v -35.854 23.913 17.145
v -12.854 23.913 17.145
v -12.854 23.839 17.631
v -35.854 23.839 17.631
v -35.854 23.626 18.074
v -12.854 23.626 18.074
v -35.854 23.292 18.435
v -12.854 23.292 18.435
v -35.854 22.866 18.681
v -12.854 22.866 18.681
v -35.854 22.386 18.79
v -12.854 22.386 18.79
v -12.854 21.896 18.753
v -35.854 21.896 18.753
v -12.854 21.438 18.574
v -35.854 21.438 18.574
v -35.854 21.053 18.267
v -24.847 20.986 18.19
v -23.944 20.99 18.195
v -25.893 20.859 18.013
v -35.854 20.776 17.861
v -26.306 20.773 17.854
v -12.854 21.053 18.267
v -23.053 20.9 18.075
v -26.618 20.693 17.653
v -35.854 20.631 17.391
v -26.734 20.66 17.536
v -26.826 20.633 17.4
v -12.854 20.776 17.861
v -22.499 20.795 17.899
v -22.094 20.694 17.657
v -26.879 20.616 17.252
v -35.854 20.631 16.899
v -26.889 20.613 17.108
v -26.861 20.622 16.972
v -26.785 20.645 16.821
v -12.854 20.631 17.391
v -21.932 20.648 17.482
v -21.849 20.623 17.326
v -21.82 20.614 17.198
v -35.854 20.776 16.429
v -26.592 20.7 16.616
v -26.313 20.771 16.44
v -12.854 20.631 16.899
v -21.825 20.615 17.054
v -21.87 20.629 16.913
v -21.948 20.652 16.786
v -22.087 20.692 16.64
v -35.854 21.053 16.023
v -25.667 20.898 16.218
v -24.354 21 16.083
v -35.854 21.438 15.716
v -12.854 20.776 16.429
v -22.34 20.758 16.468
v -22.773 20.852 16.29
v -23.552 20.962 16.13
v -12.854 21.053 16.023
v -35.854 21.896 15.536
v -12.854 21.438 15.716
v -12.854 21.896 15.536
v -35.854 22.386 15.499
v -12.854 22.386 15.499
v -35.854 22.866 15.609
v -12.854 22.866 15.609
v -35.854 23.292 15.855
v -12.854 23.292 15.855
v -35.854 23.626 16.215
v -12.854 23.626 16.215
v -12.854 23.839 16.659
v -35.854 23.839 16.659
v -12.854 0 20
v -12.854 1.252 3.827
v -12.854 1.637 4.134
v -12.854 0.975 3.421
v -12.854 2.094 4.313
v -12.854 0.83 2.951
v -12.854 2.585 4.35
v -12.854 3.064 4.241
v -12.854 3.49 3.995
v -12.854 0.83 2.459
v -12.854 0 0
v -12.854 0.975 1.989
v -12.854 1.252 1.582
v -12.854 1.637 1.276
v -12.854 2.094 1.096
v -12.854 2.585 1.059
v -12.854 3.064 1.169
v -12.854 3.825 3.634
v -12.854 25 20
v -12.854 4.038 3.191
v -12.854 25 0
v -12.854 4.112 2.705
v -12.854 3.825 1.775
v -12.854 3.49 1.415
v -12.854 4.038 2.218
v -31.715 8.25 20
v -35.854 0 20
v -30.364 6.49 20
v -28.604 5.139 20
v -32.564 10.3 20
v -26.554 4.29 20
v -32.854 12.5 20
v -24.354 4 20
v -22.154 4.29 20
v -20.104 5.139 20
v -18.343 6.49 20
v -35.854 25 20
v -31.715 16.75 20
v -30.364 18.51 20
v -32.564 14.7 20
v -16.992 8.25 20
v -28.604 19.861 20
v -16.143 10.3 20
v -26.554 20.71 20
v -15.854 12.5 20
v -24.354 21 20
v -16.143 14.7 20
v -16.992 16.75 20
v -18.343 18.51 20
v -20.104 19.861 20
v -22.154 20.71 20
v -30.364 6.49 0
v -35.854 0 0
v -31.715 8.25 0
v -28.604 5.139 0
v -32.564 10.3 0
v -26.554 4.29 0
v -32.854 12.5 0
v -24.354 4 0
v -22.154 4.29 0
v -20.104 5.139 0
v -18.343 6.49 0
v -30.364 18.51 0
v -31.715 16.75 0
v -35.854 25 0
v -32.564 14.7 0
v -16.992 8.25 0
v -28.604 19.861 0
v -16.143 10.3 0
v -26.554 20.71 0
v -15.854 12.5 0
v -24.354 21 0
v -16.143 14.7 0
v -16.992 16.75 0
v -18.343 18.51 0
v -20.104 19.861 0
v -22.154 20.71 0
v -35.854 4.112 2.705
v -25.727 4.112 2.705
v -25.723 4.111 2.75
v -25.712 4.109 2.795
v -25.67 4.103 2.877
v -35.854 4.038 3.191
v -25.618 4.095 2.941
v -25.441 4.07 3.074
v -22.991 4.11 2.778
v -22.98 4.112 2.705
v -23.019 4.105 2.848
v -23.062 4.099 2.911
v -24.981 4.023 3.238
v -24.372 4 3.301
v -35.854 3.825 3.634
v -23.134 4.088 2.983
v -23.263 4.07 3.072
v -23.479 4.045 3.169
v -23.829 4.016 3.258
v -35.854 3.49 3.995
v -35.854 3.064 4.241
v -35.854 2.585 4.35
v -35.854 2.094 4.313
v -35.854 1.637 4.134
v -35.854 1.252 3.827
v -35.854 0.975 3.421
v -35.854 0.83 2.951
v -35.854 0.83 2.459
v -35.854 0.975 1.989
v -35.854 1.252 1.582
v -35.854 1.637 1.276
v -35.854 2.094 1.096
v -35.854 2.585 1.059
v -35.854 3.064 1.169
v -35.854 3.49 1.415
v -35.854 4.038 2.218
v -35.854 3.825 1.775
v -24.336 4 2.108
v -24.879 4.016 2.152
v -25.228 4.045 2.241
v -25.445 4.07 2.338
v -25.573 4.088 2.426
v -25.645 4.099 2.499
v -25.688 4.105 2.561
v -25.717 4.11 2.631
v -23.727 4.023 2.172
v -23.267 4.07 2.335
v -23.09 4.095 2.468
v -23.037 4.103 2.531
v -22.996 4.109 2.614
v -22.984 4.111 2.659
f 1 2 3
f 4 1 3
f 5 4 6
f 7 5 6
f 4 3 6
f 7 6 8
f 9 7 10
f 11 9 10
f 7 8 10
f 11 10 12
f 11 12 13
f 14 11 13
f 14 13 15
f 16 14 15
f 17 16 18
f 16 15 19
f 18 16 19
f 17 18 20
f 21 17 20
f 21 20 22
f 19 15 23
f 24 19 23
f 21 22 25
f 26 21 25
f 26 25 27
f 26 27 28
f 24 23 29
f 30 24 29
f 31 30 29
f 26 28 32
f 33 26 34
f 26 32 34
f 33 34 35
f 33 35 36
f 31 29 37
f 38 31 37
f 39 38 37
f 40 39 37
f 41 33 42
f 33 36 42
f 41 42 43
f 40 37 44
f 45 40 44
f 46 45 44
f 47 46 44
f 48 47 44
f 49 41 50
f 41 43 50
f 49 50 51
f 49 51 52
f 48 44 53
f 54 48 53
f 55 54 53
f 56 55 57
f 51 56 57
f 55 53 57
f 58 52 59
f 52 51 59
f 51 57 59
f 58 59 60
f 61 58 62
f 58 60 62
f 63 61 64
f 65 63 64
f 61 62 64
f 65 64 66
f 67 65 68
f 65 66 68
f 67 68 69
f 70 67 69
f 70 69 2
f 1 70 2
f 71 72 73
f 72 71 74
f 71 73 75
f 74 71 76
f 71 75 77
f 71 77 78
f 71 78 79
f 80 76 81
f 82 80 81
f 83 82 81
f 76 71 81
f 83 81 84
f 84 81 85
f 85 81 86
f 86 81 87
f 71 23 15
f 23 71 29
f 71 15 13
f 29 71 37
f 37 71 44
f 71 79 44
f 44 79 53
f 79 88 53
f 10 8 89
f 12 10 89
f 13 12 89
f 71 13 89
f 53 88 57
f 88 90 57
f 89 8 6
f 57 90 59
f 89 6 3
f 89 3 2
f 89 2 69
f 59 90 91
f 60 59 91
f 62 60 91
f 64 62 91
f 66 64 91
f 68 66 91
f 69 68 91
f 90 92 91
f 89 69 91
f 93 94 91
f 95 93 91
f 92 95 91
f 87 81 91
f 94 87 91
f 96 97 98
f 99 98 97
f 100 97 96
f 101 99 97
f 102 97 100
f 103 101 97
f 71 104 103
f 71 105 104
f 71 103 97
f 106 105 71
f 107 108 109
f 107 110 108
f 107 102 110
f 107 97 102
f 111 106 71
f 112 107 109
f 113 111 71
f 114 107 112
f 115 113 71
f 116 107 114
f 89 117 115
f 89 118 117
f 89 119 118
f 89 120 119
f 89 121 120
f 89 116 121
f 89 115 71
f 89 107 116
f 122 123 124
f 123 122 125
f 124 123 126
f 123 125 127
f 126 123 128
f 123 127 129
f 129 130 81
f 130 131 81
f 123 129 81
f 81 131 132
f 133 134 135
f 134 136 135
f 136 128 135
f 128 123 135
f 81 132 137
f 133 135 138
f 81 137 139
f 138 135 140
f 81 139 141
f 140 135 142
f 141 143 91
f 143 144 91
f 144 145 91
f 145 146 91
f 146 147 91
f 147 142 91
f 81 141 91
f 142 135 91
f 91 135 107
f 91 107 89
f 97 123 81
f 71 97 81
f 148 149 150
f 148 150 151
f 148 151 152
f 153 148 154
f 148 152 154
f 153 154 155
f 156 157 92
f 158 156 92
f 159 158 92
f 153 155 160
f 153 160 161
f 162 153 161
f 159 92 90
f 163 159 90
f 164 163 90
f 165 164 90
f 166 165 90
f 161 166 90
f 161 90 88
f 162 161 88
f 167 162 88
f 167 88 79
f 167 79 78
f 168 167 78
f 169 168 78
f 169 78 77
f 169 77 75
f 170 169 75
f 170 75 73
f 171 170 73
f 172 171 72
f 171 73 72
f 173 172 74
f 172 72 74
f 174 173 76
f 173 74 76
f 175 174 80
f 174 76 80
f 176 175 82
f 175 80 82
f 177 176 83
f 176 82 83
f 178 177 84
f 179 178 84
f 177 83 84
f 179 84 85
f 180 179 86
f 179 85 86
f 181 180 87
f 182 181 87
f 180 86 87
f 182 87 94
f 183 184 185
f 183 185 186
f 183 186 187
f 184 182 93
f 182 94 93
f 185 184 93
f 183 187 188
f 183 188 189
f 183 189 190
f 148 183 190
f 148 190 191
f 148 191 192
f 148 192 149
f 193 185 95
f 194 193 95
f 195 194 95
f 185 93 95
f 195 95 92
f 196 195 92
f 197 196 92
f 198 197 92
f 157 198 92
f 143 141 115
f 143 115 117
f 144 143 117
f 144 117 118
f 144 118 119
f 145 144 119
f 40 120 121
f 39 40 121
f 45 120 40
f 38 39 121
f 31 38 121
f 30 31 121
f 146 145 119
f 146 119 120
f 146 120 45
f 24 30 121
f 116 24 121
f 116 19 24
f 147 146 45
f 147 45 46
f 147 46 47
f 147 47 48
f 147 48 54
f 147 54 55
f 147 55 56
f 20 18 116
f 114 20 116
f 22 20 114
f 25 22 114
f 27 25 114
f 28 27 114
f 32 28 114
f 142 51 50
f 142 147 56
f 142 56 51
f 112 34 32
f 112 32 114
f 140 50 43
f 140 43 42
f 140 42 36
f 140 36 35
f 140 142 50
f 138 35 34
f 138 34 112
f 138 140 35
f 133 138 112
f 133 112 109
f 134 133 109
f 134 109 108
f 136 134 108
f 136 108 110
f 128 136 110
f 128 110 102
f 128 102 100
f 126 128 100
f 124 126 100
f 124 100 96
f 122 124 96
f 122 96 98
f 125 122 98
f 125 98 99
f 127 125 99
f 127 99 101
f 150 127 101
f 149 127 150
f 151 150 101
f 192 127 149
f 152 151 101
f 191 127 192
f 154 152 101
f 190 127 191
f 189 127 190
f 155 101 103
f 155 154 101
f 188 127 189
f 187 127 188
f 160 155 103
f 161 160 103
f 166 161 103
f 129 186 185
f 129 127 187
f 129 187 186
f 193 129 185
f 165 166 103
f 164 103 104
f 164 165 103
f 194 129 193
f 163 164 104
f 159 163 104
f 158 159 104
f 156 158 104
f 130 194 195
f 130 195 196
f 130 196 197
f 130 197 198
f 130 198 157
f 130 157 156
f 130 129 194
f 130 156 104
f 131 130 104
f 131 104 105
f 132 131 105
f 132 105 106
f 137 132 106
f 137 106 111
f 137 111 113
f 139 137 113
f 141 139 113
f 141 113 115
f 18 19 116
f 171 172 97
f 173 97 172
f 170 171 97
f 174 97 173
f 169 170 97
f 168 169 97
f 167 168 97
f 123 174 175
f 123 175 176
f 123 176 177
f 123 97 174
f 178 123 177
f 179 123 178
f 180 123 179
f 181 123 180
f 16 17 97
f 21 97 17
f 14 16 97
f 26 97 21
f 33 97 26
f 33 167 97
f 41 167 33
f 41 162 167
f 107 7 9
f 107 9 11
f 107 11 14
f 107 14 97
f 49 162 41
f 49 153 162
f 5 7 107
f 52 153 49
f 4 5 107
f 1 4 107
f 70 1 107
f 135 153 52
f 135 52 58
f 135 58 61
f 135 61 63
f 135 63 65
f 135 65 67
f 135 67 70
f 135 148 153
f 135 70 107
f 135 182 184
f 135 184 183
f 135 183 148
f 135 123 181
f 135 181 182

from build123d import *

# Parameters (mm, degrees)
F0_W     = 23
F0_H     = 25
F0_R     = 8.5
F1_DEPTH = 20
F3_D     = 3.3


with BuildPart() as f1:
    # F0 (on Top) → F1 (new body)
    with BuildSketch(Plane.XY):
        with Locations((-24.353659, 12.5)):
            Rectangle(F0_W, F0_H)
        with Locations((-24.353659, 12.5)):
            Circle(F0_R, mode=Mode.SUBTRACT)
    extrude(amount=F1_DEPTH)

    # F3 (through all)
    with Locations(Plane(origin=(-35.853659, 0, 0), x_dir=(0, -1, 0), z_dir=(-1, 0, 0))):
        with Locations((-2.461657, 2.704677), (-22.262799, 17.144853), (-22.262799, 17.144853)):
            Hole(F3_D / 2)


solid = f1.part
